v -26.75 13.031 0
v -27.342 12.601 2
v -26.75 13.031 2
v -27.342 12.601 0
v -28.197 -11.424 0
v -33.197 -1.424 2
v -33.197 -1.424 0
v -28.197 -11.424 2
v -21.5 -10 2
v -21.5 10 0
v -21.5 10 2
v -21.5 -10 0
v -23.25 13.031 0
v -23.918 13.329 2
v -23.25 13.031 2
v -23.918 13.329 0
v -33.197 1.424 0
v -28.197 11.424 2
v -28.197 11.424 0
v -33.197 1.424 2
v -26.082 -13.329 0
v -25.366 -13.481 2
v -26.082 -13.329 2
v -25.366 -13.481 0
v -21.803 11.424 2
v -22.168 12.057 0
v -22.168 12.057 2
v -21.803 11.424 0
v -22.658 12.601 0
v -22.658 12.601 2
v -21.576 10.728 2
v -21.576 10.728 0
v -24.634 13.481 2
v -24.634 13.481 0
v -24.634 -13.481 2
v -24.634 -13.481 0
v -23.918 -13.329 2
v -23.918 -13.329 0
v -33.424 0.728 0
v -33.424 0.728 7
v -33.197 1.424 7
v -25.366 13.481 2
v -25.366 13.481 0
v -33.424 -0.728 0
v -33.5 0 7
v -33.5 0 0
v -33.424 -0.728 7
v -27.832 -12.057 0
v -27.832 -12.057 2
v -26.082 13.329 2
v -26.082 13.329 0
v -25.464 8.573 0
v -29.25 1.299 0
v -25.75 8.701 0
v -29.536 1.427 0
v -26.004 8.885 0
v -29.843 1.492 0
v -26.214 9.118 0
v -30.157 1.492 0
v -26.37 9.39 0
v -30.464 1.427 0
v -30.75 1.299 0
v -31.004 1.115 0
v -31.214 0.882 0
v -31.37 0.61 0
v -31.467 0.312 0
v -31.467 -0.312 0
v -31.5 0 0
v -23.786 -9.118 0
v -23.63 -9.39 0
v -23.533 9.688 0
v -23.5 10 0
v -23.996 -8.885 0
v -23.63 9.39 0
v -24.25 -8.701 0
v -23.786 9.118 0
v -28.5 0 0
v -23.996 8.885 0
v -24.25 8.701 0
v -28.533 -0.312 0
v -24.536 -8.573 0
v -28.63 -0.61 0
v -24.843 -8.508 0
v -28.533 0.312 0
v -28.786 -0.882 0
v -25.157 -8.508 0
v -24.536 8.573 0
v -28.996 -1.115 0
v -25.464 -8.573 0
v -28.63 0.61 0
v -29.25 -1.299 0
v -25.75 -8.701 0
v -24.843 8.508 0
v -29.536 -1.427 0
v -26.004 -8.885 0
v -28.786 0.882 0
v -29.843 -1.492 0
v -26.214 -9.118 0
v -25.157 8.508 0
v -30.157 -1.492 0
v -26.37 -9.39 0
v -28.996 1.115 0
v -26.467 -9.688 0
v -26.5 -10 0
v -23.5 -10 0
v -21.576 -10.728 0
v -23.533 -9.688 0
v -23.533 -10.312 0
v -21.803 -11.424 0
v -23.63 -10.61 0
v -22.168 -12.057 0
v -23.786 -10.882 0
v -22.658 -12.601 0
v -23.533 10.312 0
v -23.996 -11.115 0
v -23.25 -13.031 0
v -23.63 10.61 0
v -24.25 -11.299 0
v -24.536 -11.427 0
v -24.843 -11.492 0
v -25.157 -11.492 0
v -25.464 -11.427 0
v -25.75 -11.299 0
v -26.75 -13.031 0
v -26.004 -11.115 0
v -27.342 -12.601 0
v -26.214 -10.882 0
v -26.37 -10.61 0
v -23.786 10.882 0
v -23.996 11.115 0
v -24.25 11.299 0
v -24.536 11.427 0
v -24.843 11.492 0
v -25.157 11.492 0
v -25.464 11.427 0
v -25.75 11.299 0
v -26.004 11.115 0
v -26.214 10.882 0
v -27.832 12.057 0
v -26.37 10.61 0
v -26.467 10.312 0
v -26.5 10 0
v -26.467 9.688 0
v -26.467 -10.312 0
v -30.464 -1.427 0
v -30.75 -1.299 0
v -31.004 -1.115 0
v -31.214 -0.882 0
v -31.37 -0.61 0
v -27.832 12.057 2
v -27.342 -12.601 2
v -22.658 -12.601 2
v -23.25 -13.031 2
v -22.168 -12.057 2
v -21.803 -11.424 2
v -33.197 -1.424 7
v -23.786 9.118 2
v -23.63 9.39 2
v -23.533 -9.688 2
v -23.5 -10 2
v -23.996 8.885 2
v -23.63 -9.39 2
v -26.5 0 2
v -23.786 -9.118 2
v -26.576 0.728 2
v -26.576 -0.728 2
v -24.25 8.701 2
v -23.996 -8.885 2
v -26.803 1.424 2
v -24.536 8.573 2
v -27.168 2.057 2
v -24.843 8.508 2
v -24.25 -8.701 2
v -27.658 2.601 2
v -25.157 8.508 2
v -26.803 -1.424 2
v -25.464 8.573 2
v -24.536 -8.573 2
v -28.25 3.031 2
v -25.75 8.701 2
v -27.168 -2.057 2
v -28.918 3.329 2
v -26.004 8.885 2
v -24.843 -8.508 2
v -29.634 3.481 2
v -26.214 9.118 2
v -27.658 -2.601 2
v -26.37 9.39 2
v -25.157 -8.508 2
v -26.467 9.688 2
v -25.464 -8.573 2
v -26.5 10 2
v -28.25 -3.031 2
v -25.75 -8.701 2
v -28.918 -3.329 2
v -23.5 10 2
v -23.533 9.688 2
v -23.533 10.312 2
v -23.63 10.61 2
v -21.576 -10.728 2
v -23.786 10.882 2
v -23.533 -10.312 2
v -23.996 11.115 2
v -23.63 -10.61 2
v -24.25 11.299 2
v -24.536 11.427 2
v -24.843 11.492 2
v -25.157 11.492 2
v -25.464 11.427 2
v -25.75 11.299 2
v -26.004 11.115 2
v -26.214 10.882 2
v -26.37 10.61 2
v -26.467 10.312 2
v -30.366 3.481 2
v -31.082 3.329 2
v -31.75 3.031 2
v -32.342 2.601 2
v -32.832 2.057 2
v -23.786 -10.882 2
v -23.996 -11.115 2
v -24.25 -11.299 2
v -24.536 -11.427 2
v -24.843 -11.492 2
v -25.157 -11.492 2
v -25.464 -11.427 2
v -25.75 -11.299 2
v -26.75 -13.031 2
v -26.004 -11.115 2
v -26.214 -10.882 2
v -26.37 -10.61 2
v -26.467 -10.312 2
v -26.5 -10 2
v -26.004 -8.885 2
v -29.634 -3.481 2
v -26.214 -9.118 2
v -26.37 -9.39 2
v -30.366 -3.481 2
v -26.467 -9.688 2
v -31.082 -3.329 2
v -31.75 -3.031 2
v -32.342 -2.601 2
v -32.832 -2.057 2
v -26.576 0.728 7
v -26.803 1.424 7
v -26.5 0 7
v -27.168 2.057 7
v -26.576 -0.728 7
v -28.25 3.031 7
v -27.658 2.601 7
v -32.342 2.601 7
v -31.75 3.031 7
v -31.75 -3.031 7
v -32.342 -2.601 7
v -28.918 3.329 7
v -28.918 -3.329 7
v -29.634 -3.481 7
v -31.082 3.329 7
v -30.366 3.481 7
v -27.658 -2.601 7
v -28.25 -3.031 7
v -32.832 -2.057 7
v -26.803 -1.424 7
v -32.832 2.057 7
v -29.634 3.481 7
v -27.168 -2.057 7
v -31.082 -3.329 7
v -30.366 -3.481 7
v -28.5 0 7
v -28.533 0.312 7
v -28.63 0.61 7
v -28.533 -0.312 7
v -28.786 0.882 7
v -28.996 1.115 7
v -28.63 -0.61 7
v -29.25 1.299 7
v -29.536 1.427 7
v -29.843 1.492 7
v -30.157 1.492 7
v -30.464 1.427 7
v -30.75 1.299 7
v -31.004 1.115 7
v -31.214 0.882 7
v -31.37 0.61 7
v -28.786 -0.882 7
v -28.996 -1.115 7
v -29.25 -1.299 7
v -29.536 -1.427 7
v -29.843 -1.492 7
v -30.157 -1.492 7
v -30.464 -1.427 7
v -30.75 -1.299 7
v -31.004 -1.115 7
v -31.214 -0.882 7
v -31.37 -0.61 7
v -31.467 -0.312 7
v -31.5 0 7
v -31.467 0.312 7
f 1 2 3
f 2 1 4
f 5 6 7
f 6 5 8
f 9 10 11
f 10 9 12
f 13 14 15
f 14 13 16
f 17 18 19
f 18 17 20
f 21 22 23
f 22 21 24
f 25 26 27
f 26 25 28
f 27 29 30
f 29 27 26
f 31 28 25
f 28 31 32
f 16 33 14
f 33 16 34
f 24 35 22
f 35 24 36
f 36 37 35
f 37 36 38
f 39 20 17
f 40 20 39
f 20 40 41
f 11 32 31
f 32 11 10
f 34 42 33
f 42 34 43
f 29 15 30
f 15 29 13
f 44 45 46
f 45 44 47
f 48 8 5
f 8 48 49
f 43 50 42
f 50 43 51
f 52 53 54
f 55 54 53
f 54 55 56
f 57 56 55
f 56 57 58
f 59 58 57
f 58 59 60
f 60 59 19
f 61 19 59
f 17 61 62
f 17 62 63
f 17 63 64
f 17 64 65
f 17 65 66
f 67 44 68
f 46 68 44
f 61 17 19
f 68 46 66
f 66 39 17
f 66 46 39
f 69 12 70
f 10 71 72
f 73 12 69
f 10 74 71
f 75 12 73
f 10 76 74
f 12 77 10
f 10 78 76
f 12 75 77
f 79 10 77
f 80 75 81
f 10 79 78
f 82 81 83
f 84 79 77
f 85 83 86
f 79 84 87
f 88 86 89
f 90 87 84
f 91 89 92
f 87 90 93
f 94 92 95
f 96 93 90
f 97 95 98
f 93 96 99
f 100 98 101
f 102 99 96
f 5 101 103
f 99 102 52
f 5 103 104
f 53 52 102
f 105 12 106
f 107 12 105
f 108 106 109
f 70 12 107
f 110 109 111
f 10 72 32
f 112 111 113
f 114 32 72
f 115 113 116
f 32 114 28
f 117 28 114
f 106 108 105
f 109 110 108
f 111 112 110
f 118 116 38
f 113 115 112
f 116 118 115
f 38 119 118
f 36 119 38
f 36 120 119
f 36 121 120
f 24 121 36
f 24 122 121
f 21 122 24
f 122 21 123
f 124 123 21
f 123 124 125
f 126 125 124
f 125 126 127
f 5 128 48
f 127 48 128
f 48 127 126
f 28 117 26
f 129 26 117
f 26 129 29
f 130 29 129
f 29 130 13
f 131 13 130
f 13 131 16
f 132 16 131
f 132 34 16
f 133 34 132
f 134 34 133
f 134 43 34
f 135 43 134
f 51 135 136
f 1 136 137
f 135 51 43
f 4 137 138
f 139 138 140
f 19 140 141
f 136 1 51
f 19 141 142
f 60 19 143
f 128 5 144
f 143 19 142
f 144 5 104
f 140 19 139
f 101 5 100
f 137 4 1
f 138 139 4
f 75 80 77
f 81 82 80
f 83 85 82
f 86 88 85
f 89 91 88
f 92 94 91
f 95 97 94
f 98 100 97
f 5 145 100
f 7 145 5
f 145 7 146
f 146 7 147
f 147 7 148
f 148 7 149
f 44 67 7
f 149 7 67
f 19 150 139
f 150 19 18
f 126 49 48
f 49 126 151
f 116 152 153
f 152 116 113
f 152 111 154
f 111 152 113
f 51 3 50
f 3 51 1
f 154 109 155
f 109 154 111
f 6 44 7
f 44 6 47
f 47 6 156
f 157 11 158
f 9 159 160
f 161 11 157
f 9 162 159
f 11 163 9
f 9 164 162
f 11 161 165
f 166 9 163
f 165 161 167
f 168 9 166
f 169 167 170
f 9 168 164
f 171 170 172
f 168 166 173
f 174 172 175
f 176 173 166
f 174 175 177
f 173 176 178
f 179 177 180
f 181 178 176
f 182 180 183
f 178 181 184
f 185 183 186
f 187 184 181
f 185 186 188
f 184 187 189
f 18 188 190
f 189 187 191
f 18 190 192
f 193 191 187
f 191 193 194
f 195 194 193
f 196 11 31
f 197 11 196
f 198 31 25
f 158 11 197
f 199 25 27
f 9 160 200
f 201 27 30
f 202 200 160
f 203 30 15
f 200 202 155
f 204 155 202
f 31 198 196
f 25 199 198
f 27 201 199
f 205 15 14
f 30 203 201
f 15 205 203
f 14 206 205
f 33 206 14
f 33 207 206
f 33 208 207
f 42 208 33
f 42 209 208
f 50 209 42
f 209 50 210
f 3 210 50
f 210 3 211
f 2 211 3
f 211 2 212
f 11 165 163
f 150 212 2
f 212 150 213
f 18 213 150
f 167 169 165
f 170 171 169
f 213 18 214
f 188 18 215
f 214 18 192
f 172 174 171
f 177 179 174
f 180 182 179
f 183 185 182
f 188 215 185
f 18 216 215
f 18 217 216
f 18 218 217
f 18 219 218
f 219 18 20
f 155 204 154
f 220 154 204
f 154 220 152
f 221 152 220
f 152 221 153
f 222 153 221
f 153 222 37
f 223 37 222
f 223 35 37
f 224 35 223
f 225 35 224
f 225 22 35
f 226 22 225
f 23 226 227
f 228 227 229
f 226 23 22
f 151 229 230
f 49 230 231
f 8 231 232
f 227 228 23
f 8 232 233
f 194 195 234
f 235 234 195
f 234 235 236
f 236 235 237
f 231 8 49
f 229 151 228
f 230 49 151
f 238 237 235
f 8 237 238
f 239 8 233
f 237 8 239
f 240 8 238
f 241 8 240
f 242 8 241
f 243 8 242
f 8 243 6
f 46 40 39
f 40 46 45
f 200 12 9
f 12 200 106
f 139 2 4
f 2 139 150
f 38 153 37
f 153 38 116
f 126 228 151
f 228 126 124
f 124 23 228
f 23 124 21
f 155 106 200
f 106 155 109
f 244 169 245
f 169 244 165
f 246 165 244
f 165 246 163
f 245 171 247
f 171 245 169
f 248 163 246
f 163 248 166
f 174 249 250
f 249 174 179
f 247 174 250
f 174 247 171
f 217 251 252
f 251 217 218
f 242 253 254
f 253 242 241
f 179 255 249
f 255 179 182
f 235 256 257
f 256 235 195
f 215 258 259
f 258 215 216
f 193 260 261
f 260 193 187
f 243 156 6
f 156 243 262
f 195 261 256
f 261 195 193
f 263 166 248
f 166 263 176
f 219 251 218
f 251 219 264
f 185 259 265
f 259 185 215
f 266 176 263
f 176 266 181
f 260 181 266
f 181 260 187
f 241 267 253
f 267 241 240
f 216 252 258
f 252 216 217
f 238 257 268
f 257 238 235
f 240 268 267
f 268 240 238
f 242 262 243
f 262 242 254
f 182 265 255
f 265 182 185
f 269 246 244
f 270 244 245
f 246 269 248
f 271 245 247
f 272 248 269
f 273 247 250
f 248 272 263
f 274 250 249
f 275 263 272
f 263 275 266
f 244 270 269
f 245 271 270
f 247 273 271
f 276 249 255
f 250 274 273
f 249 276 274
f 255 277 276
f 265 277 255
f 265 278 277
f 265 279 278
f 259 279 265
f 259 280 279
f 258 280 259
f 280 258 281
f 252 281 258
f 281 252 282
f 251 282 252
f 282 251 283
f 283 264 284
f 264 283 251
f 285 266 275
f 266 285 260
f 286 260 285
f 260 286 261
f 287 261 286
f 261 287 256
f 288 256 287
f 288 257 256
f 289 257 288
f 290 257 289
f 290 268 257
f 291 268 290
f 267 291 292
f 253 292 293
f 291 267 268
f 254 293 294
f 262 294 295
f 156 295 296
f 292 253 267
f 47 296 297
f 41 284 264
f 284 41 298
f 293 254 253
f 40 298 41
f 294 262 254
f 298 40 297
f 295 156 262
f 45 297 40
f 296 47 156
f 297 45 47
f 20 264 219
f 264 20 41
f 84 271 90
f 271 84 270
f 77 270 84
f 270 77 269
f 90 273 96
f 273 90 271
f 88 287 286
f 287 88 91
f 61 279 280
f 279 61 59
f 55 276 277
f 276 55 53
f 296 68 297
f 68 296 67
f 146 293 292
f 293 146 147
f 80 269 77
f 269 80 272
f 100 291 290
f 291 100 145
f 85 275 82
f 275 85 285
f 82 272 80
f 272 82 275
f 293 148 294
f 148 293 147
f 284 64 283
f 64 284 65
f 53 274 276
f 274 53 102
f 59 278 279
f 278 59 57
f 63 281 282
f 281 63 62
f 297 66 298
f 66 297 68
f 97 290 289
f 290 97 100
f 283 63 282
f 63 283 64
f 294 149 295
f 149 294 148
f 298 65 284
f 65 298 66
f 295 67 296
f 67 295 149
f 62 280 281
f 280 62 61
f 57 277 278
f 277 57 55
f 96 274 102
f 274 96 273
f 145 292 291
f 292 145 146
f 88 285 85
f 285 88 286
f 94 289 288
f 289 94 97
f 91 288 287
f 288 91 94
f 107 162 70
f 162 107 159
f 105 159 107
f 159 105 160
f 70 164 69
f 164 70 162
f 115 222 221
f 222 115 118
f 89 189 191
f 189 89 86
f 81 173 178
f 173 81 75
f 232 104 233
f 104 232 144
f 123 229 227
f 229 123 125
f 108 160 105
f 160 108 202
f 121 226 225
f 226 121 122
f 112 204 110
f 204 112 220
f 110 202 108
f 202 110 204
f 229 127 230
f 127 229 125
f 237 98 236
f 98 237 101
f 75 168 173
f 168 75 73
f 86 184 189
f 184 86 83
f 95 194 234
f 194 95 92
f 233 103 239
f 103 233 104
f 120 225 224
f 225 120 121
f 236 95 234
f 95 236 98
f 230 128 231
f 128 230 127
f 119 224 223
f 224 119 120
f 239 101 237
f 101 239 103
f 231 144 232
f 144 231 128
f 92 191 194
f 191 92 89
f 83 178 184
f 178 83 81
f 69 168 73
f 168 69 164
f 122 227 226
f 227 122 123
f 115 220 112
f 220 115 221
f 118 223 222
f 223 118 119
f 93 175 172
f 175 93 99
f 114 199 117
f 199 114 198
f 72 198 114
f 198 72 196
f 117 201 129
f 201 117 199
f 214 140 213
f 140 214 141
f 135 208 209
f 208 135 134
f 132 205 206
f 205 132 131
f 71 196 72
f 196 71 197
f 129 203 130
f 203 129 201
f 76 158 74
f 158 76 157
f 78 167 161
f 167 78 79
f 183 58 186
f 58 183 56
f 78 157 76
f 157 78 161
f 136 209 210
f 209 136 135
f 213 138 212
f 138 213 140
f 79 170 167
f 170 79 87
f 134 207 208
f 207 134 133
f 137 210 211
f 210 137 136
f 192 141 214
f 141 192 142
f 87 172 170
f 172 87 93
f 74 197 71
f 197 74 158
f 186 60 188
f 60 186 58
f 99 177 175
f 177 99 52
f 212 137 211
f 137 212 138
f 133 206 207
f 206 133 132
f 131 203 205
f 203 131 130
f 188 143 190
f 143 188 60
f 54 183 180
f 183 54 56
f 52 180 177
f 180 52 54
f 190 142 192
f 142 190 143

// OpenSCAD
BASE_THICKNESS = 2;
SHAFT_LENGTH = 5;
SHAFT_DIA = 7;

PLATFORM_MOUNT_DIA = 50;//80;
PLATFORM_MOUNT_HOLE_DIA = 3;
PLATFORM_MOUNT_SPACING = 20;

COOLER_MOUNT_DIA = 60;
COOLER_MOUNT_HOLE_DIA = 3;

$fn = 30;

difference() {
    h = BASE_THICKNESS + SHAFT_LENGTH;
    union() {
        hull() {
            translate([-COOLER_MOUNT_DIA/2, 0, 0])
            cylinder(d = SHAFT_DIA, h = BASE_THICKNESS);
            translate([-PLATFORM_MOUNT_DIA/2, -PLATFORM_MOUNT_SPACING/2, 0])
            cylinder(d = SHAFT_DIA, h = BASE_THICKNESS);
            translate([-PLATFORM_MOUNT_DIA/2, PLATFORM_MOUNT_SPACING/2, 0])
            cylinder(d = SHAFT_DIA, h = BASE_THICKNESS);
        }
        translate([-COOLER_MOUNT_DIA/2, 0, 0])
        cylinder(d = SHAFT_DIA, h = h);
    }

    #translate([-COOLER_MOUNT_DIA/2, 0, 0])
    cylinder(d = COOLER_MOUNT_HOLE_DIA, h = h);

    #translate([-PLATFORM_MOUNT_DIA/2, -PLATFORM_MOUNT_SPACING/2, 0])
    cylinder(d = PLATFORM_MOUNT_HOLE_DIA, h = h);

    #translate([-PLATFORM_MOUNT_DIA/2, PLATFORM_MOUNT_SPACING/2, 0])
    cylinder(d = PLATFORM_MOUNT_HOLE_DIA, h = h);
}
